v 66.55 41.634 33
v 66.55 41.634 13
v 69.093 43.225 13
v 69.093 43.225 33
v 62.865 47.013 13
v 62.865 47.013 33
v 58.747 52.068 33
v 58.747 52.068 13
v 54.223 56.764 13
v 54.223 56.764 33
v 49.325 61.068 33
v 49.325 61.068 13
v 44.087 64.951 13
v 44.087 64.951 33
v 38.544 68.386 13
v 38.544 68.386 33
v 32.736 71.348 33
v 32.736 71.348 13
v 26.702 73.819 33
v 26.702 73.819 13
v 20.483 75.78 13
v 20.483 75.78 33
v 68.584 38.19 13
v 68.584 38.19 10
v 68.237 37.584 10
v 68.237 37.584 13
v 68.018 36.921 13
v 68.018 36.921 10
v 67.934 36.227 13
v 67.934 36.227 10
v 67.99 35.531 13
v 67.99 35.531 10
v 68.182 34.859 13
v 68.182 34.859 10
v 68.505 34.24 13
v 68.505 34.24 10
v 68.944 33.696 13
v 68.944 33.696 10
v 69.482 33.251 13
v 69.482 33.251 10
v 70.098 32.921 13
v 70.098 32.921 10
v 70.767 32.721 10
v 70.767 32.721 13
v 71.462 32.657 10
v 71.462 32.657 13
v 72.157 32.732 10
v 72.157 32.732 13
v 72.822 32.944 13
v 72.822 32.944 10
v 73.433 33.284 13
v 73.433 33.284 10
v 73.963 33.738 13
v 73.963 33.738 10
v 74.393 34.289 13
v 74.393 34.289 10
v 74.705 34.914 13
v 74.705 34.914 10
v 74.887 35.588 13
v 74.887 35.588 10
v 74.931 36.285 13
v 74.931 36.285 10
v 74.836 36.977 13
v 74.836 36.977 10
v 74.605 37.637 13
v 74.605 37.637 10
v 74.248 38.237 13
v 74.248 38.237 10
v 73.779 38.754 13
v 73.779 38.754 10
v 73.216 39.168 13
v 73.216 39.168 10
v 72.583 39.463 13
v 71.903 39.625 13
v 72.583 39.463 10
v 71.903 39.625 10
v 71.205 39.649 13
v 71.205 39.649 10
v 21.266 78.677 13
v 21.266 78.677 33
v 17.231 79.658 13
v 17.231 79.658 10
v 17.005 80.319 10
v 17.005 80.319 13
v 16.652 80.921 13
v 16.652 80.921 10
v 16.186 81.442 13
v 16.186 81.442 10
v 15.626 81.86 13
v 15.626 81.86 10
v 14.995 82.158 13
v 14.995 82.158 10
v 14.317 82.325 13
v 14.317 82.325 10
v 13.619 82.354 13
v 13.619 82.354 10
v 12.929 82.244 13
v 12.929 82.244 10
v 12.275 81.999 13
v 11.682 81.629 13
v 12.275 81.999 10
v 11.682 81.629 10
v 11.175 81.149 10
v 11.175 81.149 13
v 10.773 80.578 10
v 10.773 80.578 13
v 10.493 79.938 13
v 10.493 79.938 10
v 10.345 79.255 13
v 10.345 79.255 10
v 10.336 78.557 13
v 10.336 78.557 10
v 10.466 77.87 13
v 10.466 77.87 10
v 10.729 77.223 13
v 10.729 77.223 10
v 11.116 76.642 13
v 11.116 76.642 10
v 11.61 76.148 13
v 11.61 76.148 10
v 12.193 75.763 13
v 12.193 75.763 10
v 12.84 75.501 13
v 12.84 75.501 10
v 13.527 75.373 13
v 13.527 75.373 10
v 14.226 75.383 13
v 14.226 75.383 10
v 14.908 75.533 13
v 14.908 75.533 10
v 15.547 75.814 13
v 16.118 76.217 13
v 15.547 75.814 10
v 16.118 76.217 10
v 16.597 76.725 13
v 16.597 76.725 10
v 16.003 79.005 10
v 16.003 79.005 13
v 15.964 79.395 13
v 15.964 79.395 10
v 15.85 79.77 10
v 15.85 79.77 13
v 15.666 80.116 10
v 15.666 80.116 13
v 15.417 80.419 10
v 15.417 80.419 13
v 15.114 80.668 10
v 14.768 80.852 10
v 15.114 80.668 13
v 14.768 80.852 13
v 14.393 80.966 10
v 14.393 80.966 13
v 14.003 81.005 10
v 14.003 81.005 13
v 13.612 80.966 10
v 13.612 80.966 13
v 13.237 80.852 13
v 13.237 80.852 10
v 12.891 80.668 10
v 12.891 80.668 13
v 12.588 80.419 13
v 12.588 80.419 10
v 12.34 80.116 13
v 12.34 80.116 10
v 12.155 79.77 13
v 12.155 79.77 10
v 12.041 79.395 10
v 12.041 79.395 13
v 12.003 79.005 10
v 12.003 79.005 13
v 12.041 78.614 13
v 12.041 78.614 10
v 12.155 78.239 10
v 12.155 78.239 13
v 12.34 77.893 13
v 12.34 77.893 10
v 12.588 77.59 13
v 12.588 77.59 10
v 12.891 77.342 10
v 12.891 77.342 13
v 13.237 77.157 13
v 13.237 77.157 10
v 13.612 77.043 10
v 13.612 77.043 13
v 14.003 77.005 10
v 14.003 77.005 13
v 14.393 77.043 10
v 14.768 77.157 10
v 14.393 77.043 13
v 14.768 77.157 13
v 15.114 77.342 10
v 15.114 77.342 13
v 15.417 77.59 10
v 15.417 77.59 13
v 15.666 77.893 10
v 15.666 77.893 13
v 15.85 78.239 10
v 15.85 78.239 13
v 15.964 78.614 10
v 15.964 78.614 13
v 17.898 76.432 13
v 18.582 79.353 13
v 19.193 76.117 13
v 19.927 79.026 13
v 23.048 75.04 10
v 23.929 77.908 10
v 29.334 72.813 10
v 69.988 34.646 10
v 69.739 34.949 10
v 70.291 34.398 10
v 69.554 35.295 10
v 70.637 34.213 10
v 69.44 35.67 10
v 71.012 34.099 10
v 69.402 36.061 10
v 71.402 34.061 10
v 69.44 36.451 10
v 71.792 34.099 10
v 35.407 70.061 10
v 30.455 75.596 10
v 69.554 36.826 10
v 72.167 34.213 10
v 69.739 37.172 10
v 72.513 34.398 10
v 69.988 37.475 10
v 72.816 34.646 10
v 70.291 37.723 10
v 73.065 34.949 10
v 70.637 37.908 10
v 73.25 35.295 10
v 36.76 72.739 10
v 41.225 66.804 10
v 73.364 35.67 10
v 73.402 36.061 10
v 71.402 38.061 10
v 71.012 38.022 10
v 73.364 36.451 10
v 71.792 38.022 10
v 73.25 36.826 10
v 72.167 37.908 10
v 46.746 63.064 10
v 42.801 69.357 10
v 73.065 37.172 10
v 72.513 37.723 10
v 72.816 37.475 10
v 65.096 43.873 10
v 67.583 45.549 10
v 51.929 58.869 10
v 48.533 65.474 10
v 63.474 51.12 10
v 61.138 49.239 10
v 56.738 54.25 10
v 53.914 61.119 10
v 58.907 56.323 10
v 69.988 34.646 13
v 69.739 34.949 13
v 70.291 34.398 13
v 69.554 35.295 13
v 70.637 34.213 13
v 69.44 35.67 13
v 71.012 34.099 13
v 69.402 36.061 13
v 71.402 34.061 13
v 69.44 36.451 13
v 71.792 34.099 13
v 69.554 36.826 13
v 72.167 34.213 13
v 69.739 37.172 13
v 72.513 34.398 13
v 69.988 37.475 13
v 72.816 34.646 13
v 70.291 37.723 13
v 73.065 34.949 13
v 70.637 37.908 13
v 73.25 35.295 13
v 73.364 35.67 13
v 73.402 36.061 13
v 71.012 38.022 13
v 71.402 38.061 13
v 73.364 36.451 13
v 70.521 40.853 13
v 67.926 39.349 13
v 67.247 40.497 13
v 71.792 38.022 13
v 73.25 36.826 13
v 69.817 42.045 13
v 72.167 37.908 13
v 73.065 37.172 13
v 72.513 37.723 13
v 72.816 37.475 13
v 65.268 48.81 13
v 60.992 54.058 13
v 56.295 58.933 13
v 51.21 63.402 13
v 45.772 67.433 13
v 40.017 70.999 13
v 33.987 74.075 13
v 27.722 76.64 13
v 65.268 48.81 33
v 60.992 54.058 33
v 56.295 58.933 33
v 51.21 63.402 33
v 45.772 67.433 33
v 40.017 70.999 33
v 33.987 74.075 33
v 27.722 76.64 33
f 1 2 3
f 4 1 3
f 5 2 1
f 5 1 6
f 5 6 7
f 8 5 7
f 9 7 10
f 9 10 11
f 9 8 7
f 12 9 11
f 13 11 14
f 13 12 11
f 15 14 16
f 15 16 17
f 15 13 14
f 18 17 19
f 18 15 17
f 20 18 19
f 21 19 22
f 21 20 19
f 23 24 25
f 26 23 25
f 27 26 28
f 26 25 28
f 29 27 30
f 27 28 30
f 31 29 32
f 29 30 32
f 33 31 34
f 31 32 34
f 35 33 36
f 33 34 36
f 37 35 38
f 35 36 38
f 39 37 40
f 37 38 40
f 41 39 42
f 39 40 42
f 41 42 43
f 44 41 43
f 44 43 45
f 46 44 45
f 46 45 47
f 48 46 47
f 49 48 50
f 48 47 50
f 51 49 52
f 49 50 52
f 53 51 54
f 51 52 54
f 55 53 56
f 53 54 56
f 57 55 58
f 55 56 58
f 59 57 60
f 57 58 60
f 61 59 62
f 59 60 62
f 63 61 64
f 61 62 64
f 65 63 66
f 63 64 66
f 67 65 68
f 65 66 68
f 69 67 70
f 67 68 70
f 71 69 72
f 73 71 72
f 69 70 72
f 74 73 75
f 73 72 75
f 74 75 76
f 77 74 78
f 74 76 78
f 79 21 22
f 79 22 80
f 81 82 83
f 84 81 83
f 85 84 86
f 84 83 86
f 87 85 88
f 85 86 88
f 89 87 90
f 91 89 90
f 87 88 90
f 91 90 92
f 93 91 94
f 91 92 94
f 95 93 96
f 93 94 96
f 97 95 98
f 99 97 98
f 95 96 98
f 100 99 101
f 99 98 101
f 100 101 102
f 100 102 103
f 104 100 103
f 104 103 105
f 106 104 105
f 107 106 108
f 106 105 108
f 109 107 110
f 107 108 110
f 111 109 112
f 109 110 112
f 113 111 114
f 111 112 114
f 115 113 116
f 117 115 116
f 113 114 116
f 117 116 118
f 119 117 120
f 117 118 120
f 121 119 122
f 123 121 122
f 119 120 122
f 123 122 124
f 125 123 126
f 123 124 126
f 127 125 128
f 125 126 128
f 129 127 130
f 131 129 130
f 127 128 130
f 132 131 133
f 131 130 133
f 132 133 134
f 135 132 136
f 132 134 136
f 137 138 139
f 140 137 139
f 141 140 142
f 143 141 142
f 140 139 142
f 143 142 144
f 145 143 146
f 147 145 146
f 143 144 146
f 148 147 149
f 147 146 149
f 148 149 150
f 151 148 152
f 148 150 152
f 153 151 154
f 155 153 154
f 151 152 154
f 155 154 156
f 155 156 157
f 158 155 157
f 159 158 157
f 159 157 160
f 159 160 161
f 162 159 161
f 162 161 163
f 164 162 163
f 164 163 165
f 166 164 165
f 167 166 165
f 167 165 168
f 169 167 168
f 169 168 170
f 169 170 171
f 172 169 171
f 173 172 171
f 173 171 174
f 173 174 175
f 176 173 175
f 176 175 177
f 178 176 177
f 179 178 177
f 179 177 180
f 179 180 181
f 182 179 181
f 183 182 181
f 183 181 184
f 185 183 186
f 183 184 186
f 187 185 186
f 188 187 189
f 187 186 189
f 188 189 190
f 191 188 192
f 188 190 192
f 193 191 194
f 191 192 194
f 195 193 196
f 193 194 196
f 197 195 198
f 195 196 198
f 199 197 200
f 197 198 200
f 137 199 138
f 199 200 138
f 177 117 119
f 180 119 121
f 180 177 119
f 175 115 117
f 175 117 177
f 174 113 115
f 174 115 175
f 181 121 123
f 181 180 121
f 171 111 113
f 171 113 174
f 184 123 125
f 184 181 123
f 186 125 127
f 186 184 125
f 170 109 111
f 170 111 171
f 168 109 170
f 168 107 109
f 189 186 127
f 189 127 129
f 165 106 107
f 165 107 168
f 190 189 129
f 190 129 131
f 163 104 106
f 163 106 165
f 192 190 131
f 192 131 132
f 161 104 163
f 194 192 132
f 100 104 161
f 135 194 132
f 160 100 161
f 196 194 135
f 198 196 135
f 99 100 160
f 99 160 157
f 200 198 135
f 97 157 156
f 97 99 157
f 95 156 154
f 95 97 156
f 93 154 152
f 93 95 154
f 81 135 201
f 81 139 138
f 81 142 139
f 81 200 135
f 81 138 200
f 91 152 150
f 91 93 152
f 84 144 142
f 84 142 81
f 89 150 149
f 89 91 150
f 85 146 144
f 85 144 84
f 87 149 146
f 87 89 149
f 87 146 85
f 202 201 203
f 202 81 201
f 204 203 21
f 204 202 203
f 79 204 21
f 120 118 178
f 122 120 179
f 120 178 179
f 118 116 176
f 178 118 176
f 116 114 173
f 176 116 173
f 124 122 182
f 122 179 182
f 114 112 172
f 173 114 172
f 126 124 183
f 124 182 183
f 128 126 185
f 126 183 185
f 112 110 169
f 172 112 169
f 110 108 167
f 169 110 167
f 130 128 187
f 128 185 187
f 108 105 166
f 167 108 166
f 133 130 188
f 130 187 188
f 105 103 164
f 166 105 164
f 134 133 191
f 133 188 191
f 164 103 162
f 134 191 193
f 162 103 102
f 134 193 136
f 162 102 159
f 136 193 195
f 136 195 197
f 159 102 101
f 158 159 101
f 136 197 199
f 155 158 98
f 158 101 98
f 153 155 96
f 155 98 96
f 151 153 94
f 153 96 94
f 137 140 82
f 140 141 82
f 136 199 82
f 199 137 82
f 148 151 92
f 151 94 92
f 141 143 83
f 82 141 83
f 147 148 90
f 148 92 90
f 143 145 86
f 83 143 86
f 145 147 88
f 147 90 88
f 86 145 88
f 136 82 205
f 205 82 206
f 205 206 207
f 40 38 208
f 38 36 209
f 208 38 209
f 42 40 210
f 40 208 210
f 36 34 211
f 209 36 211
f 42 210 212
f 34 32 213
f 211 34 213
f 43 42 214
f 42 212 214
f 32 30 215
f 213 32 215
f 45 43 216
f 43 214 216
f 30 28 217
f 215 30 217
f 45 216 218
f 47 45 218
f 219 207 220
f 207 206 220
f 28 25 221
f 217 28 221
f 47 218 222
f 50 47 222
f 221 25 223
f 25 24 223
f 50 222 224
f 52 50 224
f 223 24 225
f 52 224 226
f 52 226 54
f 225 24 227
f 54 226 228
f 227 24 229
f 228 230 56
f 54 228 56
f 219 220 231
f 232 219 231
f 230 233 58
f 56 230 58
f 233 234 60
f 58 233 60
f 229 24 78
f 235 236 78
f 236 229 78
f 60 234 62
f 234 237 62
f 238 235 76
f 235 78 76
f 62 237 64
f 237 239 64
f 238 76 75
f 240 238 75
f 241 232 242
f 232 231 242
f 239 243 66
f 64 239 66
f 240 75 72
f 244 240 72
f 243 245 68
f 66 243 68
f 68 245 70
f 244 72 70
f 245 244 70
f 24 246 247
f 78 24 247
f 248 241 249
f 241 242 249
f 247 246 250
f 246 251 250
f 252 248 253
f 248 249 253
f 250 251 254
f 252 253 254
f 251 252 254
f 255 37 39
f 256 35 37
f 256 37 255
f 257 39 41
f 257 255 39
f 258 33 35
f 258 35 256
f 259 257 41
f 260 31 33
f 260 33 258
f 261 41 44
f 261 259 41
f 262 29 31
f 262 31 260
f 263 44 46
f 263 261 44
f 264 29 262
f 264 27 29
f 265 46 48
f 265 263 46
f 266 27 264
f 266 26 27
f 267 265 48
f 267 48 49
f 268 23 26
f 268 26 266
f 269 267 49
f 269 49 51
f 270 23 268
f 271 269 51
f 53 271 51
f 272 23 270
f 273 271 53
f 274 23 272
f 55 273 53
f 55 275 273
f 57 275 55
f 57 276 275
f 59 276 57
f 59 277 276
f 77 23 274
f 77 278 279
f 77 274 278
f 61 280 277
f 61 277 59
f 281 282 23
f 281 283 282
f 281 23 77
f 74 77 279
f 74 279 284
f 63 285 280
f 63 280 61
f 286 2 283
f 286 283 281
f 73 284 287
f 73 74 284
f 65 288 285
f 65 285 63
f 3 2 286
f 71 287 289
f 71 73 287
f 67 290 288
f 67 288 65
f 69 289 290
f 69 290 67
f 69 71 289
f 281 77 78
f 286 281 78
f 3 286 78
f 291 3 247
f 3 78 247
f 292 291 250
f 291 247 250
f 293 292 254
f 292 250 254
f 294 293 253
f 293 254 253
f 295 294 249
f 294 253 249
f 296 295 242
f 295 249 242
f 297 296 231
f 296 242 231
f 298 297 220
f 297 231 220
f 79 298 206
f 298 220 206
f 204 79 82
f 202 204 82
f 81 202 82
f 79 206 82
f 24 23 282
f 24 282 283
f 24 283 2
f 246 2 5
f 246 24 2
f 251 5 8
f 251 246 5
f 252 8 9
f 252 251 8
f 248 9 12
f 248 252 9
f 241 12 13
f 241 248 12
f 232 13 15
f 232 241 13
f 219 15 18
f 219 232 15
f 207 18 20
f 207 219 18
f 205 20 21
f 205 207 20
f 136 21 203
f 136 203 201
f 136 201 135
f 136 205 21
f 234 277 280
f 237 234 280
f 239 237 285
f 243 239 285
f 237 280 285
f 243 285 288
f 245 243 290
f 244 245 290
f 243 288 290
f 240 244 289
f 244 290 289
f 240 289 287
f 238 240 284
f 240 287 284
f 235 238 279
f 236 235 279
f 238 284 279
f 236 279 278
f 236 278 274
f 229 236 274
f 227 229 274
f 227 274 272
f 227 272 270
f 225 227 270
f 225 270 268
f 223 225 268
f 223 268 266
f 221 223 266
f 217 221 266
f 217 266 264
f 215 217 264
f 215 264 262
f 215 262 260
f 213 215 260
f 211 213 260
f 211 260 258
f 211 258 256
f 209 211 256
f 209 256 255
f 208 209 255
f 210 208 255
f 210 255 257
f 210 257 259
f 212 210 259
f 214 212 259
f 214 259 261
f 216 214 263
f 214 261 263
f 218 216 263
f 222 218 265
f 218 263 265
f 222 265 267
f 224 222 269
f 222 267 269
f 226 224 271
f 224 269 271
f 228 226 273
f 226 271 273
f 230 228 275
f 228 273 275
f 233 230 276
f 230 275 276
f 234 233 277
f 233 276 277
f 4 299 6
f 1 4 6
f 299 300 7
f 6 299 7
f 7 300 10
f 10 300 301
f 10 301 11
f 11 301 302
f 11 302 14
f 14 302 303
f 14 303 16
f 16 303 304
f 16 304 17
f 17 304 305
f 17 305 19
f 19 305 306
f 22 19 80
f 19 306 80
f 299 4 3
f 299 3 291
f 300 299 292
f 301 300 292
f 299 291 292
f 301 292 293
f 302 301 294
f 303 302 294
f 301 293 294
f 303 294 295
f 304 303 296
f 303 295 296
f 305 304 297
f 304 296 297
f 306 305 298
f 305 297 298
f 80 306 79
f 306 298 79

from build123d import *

# Parameters (mm, degrees)
PAD113_DEPTH    = 3
PAD114_DEPTH    = 20
SKETCH279_R     = 2
POCKET134_DEPTH = 3.001


with BuildPart() as part:
    # Sketch277 → Pad113 (new body)
    with BuildSketch(Plane.XY):
        with BuildLine():
            ThreePointArc((71.205245, 39.64925), (48.53257, 65.473961), (17.230996, 79.65766))
            ThreePointArc((17.230996, 79.65766), (10.402187, 79.600128), (16.596726, 76.725476))
            ThreePointArc((68.584193, 38.189769), (46.746095, 63.063877), (16.596726, 76.725476))
            ThreePointArc((68.584193, 38.189769), (73.135876, 33.098784), (71.205245, 39.64925))
        make_face()
    extrude(amount=PAD113_DEPTH)

    # Sketch278 (on Face6 of Pad113) → Pad114 (join)
    with BuildSketch(Plane.XY.offset(3)):
        with BuildLine():
            ThreePointArc((66.549812, 41.633791), (46.746095, 63.063877), (20.483489, 75.78045))
            Line((20.483489, 75.78045), (21.266298, 78.676519))
            ThreePointArc((69.093116, 43.224892), (48.53257, 65.473961), (21.266298, 78.676519))
            Line((66.549812, 41.633791), (69.093116, 43.224892))
        make_face()
    extrude(amount=PAD114_DEPTH)

    # Sketch279 (on Face5 of Pad114) → Pocket134 (cut, through all)
    with BuildSketch(Plane.XY.offset(3)):
        with Locations((71.402069, 36.060539)):
            Circle(SKETCH279_R)
        with Locations((14.00263, 79.004593)):
            Circle(SKETCH279_R)
    extrude(amount=-POCKET134_DEPTH, mode=Mode.SUBTRACT)


with BuildPart() as part_1:
    # Body099 placement: moved
    add(part.part.moved(Location((0, 0, 10))))


solid = part_1.part
